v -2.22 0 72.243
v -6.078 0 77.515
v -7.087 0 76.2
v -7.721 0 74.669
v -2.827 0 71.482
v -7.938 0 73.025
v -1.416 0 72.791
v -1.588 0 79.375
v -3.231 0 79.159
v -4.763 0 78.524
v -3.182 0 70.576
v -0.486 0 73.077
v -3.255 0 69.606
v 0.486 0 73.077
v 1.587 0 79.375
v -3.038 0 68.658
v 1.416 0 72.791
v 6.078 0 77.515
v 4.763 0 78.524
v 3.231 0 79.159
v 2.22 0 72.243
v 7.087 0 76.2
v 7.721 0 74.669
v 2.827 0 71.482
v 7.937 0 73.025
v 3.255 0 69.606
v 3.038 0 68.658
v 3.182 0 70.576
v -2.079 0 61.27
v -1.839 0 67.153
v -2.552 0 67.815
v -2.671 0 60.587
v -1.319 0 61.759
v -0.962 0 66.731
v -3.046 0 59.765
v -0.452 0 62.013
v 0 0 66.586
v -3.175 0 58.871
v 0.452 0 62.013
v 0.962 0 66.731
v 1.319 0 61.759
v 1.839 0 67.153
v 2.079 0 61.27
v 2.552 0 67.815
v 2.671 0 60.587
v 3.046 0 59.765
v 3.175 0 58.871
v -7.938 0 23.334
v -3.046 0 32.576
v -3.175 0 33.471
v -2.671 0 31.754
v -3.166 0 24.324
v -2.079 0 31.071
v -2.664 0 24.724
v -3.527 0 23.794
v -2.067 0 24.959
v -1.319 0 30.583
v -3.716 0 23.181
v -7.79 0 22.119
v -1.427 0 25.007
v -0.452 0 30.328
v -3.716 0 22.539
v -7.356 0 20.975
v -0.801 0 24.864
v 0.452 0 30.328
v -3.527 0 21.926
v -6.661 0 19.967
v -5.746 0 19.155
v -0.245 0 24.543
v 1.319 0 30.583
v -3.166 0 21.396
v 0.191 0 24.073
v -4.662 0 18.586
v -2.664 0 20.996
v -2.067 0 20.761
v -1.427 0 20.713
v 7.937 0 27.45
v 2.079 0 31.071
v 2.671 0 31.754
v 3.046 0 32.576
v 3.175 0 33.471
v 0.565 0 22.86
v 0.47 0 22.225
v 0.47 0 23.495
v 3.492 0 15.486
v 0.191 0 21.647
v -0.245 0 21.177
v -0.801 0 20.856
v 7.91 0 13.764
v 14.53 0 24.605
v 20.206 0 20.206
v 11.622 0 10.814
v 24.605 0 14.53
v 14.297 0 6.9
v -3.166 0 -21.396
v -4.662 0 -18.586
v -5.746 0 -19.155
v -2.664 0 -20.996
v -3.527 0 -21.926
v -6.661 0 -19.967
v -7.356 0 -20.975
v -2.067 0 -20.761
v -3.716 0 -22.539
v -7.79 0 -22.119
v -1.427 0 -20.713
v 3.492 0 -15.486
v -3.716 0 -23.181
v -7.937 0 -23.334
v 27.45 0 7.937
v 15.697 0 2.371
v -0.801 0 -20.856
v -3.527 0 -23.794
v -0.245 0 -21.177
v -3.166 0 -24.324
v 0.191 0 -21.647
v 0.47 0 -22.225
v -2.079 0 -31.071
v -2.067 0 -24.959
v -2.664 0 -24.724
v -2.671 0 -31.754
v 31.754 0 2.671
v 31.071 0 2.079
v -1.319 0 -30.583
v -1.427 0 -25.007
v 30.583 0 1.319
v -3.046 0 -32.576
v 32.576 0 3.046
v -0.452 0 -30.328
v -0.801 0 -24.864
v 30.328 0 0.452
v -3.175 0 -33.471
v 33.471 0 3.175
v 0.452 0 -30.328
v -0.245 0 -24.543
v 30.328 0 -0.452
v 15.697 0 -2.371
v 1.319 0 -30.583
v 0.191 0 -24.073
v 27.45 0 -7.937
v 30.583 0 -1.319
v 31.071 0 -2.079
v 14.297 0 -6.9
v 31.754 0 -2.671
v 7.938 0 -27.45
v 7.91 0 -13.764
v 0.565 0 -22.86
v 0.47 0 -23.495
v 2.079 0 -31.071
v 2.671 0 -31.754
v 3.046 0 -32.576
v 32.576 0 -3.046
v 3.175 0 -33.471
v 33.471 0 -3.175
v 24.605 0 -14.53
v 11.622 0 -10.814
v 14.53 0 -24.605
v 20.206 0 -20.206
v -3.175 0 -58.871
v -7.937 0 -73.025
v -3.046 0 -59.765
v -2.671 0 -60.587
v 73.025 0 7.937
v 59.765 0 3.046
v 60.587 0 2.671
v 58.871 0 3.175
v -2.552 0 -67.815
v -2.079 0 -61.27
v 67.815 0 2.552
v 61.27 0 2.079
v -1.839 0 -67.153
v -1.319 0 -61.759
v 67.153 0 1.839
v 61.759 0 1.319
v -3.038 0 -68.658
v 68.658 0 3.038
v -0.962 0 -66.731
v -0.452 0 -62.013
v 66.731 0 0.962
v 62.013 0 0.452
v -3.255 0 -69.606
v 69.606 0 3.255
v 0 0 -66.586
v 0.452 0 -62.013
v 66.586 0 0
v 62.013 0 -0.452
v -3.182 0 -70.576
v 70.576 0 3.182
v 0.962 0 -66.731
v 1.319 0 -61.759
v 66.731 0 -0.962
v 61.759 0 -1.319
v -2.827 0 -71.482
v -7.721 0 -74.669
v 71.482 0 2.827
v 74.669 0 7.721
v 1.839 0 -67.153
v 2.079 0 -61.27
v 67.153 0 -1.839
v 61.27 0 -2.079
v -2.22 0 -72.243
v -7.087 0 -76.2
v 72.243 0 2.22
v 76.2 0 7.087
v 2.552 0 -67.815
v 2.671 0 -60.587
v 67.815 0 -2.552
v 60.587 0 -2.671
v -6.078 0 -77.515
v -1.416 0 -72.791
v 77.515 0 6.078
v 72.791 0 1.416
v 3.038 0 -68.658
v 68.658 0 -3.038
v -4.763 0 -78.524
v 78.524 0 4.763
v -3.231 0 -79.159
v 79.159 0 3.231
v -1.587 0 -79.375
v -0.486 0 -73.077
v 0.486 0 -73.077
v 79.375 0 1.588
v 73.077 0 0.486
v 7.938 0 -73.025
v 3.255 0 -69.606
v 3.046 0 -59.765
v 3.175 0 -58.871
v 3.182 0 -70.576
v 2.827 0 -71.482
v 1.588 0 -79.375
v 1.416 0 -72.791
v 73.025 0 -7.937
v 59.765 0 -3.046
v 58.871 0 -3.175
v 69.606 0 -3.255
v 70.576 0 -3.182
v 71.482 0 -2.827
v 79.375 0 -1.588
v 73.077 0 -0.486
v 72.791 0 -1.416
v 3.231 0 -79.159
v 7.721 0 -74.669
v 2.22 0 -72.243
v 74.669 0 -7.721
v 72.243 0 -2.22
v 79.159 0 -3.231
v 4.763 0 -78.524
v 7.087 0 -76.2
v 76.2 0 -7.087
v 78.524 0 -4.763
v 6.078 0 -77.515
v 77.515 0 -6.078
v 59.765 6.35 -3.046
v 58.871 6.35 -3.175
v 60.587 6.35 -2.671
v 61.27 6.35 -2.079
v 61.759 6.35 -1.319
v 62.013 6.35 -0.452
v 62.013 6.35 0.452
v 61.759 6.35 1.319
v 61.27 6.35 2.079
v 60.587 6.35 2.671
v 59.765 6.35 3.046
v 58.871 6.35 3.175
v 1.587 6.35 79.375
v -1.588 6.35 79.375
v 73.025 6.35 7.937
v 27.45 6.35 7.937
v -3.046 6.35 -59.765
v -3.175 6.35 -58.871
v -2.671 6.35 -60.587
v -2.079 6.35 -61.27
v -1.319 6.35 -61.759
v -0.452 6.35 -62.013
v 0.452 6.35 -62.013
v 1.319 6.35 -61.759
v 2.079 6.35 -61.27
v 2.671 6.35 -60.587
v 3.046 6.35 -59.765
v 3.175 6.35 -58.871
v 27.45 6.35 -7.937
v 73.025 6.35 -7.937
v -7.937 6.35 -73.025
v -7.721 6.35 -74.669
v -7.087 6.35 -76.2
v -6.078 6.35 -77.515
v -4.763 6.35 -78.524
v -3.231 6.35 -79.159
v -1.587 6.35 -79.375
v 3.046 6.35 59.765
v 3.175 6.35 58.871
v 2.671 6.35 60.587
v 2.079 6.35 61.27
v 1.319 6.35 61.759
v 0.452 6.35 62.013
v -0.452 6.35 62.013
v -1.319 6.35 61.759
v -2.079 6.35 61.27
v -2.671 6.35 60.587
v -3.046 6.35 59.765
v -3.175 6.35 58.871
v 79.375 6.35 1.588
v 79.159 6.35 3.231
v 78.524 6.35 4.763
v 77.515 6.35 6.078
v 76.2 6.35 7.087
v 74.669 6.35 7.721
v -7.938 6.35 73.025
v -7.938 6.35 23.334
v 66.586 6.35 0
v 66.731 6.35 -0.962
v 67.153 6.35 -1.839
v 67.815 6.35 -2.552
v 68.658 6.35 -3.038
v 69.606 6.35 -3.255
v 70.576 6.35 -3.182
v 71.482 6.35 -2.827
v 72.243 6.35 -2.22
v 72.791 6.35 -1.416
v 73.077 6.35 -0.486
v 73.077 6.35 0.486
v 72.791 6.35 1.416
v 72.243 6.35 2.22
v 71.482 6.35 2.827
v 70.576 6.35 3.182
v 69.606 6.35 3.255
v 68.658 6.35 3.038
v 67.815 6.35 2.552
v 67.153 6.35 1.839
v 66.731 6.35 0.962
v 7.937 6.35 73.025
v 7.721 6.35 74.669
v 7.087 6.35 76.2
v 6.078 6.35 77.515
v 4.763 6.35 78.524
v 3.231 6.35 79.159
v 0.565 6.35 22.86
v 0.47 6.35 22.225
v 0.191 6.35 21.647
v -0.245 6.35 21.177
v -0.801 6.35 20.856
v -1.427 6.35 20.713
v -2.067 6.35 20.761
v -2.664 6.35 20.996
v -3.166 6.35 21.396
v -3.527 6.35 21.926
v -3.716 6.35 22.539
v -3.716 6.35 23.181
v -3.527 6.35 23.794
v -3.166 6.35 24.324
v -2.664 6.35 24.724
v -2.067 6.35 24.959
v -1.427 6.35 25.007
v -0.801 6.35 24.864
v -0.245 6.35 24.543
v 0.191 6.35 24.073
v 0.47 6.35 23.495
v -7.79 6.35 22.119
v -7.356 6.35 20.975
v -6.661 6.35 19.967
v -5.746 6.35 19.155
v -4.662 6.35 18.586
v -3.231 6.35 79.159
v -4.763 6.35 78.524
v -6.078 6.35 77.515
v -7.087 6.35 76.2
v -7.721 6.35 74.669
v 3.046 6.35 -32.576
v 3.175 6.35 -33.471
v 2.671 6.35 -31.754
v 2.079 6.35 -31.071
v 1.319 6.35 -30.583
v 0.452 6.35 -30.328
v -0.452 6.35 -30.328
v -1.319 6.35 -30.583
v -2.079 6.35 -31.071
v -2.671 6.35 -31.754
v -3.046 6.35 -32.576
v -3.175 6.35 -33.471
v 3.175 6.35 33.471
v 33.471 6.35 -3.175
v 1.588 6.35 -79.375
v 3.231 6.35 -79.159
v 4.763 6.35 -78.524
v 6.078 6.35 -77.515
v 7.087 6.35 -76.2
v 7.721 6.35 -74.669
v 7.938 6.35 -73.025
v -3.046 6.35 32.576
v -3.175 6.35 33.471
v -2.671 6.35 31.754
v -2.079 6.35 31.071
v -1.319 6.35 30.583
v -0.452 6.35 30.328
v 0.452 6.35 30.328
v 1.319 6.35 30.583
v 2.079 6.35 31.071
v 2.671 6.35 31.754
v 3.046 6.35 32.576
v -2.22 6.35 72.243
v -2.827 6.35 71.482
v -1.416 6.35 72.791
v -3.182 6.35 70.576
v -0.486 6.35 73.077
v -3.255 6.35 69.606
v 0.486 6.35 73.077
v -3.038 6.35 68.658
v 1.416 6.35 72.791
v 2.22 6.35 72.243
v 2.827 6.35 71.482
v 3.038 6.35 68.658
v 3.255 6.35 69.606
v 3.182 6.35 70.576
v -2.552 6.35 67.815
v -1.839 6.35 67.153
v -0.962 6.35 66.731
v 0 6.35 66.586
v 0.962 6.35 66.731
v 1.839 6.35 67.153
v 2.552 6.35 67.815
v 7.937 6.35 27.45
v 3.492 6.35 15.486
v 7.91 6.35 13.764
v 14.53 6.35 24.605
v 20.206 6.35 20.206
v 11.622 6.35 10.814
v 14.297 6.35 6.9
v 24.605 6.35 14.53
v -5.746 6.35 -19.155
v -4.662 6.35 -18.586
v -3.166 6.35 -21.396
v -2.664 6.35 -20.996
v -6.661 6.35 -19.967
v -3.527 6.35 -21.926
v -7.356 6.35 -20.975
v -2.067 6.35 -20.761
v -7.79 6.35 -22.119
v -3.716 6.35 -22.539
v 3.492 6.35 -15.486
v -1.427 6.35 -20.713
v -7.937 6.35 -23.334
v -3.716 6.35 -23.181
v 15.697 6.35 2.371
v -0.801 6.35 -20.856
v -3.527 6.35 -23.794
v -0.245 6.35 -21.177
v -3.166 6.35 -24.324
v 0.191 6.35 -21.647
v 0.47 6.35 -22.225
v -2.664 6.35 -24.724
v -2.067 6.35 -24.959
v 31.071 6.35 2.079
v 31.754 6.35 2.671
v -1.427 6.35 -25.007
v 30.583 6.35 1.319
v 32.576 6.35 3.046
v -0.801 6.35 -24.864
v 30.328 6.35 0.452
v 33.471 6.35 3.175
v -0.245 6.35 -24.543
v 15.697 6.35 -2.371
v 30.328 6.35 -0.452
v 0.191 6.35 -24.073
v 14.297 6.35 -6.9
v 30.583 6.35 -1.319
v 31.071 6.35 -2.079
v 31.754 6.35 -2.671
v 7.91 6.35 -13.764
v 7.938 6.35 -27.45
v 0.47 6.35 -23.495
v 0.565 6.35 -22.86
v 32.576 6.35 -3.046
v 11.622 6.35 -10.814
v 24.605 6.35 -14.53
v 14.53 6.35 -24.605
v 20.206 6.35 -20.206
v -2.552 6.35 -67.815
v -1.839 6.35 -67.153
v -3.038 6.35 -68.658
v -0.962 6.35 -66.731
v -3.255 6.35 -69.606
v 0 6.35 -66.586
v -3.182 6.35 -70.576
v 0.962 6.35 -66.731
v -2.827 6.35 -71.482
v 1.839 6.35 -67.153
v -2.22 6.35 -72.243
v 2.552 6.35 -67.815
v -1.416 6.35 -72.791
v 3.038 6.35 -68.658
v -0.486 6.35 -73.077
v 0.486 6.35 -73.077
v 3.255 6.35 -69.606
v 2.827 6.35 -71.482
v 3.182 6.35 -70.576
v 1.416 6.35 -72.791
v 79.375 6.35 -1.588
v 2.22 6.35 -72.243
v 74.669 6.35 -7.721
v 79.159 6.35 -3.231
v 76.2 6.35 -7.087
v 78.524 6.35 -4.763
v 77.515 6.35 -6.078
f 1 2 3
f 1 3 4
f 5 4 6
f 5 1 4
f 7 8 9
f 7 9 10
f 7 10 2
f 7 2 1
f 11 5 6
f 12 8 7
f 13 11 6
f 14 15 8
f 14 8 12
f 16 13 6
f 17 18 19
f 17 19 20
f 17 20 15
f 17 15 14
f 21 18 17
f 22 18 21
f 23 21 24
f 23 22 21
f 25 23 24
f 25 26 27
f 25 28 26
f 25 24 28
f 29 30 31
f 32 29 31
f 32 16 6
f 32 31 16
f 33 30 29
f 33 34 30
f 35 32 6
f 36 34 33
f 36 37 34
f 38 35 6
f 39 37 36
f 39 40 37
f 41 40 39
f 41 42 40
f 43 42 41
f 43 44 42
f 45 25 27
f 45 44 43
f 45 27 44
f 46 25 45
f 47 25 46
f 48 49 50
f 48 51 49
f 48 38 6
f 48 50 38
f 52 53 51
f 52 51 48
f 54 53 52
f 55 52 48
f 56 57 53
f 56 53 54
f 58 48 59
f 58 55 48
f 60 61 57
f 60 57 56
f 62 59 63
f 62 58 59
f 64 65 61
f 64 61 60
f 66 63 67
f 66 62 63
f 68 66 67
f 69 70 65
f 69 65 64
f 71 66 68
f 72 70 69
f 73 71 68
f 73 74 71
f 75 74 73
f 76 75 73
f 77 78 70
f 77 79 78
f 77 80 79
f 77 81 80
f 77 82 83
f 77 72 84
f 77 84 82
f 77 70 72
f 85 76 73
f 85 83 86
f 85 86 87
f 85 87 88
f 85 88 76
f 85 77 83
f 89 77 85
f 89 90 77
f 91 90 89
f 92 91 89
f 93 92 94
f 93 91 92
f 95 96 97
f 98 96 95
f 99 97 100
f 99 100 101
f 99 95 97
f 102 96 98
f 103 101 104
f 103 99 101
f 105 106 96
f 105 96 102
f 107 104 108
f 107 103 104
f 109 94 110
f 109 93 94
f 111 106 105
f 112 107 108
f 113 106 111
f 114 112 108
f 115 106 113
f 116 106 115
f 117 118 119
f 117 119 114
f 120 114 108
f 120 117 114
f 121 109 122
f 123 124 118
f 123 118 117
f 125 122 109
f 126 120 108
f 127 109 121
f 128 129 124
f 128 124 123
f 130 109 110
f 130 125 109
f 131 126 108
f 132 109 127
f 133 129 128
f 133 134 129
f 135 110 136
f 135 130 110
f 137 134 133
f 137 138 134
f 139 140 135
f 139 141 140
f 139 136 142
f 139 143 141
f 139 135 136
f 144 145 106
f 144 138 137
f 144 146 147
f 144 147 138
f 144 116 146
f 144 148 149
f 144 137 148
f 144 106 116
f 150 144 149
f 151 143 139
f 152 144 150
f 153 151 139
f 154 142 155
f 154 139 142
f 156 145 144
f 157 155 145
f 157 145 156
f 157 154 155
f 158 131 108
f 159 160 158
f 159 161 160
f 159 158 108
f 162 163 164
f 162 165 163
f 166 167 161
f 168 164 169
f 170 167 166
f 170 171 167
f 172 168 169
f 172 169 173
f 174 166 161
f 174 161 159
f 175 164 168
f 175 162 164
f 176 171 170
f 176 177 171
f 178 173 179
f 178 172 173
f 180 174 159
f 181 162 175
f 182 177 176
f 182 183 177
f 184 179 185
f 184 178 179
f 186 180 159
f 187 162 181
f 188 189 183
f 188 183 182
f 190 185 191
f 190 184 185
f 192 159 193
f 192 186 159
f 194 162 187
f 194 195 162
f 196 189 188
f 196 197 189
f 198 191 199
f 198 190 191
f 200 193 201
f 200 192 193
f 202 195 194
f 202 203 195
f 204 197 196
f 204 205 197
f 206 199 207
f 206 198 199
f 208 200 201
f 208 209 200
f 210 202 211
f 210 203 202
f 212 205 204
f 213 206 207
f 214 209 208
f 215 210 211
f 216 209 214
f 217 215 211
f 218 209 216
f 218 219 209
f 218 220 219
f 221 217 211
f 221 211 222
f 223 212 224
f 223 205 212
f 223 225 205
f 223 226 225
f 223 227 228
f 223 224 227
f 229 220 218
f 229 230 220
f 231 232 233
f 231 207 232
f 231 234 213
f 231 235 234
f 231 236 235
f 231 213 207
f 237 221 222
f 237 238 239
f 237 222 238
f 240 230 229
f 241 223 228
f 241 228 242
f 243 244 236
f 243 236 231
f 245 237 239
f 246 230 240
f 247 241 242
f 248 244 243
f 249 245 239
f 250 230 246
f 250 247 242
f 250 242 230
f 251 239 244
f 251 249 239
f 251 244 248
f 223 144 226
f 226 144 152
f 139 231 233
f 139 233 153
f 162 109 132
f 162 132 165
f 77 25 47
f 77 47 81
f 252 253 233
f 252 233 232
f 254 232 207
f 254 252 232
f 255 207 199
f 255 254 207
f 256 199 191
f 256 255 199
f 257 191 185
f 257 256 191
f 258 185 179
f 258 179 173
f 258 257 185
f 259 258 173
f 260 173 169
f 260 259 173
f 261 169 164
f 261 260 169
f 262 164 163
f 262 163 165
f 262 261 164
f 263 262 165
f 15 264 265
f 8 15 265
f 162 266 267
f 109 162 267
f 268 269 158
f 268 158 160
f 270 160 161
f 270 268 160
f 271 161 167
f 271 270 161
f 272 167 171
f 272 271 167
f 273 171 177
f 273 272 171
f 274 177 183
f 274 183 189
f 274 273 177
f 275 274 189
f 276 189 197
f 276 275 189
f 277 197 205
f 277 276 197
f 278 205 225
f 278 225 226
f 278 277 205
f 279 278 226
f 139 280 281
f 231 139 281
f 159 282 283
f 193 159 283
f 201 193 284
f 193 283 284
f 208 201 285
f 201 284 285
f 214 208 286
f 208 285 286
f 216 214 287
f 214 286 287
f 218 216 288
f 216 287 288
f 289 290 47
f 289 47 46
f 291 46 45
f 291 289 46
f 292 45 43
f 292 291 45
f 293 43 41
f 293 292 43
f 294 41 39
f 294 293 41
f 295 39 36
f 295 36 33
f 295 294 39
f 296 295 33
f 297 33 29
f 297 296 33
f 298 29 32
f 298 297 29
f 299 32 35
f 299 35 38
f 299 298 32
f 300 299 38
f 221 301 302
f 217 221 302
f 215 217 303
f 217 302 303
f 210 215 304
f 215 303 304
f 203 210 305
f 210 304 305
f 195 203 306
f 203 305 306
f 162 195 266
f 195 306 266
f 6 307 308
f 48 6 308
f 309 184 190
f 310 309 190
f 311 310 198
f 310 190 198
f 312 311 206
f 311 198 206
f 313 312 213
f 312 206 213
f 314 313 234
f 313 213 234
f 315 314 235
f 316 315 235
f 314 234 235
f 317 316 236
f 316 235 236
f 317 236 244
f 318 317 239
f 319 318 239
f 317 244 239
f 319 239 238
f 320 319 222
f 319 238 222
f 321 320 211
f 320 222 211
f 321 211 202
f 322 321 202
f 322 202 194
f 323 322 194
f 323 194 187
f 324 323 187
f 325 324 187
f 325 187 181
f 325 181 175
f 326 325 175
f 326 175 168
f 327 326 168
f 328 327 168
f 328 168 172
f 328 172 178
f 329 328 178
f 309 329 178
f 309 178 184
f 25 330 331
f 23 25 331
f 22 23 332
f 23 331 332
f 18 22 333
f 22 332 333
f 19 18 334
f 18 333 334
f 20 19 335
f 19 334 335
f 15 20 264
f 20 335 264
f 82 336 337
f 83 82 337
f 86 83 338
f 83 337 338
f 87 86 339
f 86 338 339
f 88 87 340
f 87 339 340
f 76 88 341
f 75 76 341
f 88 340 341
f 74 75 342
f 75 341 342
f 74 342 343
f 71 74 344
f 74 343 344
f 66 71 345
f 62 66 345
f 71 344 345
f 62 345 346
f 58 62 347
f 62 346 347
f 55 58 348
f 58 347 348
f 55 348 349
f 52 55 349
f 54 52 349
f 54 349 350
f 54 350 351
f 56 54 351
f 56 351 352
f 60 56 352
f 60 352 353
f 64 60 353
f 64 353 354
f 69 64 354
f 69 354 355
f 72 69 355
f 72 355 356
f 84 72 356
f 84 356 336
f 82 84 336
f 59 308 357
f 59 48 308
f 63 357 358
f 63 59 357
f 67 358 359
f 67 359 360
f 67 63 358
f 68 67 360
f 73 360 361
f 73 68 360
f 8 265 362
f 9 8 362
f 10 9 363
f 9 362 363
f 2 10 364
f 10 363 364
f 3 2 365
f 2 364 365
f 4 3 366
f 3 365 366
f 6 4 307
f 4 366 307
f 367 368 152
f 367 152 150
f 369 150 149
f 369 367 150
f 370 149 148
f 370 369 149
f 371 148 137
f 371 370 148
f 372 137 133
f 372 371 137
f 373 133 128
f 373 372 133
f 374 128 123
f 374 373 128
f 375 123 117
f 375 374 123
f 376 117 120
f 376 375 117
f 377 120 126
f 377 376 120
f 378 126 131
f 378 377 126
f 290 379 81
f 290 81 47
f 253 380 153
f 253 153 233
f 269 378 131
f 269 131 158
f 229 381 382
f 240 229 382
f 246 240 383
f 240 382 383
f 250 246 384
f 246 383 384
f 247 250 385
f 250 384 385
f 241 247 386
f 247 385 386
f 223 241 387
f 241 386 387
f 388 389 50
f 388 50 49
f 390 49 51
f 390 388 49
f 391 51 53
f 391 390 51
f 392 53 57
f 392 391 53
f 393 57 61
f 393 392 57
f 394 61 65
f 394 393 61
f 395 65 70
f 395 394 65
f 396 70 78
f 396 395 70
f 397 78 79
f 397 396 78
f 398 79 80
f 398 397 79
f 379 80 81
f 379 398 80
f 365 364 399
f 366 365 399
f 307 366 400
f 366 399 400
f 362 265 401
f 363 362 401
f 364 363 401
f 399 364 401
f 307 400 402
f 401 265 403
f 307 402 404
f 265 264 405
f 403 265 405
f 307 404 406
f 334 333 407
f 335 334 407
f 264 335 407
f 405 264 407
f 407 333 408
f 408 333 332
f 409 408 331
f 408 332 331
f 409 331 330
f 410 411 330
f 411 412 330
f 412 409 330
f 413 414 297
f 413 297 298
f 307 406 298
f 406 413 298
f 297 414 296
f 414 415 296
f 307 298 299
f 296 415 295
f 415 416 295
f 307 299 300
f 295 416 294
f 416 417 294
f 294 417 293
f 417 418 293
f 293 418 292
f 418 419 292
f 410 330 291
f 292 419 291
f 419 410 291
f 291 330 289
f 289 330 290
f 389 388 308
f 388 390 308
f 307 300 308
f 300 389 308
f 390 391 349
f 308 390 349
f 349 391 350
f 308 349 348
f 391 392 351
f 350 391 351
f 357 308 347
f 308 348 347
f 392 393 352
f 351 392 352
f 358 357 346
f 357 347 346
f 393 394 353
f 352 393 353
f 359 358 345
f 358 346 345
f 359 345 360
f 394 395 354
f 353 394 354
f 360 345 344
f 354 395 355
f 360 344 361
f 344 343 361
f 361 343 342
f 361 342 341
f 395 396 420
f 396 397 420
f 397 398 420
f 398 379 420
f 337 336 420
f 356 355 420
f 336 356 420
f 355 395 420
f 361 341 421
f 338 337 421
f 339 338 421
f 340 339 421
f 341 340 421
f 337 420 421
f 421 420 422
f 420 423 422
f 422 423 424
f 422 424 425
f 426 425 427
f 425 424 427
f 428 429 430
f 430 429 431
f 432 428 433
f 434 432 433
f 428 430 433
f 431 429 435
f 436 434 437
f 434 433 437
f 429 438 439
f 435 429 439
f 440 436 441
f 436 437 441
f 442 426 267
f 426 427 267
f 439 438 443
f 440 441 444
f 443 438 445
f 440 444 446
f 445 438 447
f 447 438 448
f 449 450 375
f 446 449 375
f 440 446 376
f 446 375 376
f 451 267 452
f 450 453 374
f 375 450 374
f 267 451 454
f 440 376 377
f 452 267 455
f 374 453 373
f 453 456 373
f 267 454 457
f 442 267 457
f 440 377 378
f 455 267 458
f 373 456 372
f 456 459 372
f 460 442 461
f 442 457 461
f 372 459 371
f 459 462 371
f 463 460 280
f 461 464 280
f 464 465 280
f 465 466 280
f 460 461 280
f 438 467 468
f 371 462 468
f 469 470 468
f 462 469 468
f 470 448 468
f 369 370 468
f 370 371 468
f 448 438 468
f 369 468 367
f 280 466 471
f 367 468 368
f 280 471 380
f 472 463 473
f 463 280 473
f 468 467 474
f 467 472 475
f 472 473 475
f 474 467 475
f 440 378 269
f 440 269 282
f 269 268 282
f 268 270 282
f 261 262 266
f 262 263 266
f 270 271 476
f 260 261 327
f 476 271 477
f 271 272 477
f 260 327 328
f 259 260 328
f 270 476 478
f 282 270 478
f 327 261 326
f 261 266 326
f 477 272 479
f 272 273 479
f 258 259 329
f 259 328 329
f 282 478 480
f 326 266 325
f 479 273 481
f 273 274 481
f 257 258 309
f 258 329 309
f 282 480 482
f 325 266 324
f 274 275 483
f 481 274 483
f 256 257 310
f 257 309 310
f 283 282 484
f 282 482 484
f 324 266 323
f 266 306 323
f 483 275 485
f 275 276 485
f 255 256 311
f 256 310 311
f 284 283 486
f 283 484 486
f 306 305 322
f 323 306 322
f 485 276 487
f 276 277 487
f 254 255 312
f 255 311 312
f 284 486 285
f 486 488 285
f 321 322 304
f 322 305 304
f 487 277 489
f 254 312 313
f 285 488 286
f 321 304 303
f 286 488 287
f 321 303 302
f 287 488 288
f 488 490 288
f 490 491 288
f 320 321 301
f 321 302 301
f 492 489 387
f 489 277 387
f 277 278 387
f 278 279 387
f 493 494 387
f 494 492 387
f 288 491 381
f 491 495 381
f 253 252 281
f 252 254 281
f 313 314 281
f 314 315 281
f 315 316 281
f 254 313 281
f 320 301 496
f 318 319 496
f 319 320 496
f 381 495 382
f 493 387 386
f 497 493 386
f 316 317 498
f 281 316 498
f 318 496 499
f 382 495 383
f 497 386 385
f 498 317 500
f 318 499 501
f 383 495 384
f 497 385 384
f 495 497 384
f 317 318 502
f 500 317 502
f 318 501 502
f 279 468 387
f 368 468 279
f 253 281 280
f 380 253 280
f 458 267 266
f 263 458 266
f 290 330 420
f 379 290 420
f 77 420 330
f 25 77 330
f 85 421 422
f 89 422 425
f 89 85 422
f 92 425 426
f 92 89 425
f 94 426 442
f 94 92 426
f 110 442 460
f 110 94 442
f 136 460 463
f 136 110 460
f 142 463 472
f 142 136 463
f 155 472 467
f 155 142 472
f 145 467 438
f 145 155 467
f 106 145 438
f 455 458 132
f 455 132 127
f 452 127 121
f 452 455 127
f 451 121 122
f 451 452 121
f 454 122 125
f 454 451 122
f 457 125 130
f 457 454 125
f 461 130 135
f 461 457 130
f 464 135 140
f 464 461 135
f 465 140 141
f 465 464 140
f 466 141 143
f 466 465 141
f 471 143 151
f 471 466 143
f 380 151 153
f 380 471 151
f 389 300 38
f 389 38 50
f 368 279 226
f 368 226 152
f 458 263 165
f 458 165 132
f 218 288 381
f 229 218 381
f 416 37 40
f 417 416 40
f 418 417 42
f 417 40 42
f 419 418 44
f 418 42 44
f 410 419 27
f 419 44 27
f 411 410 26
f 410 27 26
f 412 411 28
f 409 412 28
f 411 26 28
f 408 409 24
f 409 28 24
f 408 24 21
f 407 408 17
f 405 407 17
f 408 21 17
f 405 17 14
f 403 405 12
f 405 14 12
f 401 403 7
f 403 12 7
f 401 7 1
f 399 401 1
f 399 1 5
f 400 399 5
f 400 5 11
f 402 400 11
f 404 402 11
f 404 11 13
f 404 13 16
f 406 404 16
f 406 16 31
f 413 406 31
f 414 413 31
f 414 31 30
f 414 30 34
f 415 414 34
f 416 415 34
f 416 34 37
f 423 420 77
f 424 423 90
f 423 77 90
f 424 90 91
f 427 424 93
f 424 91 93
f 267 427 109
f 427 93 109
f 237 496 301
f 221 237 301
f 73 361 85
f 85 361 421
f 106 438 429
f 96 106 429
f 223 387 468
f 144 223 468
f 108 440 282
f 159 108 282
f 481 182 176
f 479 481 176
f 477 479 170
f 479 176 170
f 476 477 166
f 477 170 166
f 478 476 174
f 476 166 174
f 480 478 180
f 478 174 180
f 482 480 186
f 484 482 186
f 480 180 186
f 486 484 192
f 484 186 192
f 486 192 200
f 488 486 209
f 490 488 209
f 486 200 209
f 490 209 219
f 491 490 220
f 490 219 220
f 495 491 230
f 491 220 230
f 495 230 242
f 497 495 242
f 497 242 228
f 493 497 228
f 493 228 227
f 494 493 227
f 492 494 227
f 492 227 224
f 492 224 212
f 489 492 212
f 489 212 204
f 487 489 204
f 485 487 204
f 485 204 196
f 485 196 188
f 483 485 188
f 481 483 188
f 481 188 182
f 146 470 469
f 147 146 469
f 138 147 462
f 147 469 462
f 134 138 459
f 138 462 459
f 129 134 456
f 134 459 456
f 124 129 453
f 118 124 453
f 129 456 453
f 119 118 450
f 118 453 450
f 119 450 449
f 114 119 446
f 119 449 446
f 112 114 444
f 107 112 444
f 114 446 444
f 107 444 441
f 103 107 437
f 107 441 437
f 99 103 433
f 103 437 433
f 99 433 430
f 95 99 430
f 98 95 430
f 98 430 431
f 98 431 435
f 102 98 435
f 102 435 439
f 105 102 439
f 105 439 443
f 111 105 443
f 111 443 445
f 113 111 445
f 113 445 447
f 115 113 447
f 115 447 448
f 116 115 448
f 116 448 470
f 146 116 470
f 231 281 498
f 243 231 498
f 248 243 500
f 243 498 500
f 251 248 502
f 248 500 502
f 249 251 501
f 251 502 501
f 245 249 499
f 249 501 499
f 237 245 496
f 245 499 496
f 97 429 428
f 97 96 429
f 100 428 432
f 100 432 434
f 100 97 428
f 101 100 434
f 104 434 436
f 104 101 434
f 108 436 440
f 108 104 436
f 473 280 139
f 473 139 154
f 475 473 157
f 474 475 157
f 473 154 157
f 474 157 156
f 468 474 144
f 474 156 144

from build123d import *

# Parameters (mm, degrees)
SKETCH1_R                = 28.575
SKETCH1_R_2              = 15.875
BOSS_EXTRUDE1_DEPTH      = 6.35
BOSS_EXTRUDE2_DEPTH      = 6.35
F_0_257_DIAMETER_HOLE1_D = 6.5278
CIRPATTERN1_COUNT        = 4
CUT_EXTRUDE1_DEPTH       = 7.35
FILLET1_R                = 5.08
SKETCH6_R                = 2.15265
CUT_EXTRUDE2_DEPTH       = 7.35


with BuildPart() as part:
    # Sketch1 → Boss-Extrude1 (new body)
    with BuildSketch(Plane(origin=(0, 0, 0), x_dir=(1, 0, 0), z_dir=(0, 1, 0))):
        Circle(SKETCH1_R)
        Circle(SKETCH1_R_2, mode=Mode.SUBTRACT)
    extrude(amount=BOSS_EXTRUDE1_DEPTH)

    # Sketch2 → Boss-Extrude2 (add)
    with BuildSketch(Plane(origin=(0, 6.35, 0), x_dir=(1, 0, 0), z_dir=(0, 1, 0))):
        with BuildLine():
            Line((73.025, -7.9375), (25.4, -7.9375))
            Line((25.4, -7.9375), (25.4, 7.9375))
            Line((25.4, 7.9375), (73.025, 7.9375))
            ThreePointArc((73.025, 7.9375), (77.515128061, 6.077628061), (79.375, 1.5875))
            Line((79.375, 1.5875), (79.375, -1.5875))
            ThreePointArc((79.375, -1.5875), (77.515128061, -6.077628061), (73.025, -7.9375))
        make_face()
        with BuildLine():
            Line((58.870802517, -3.175), (33.470802517, -3.175))
            ThreePointArc((33.470802517, -3.175), (30.295802517, 0), (33.470802517, 3.175))
            Line((33.470802517, 3.175), (58.870802517, 3.175))
            ThreePointArc((58.870802517, 3.175), (62.045802517, 0), (58.870802517, -3.175))
        make_face(mode=Mode.SUBTRACT)
    boss_extrude2 = extrude(amount=-BOSS_EXTRUDE2_DEPTH)

    # F (0.257) Diameter Hole1 (through all)
    with Locations(Plane(origin=(0, 6.35, 0), x_dir=(1, 0, 0), z_dir=(0, 1, 0))):
        with Locations((69.85, 0)):
            f_0_257_diameter_hole1 = Hole(F_0_257_DIAMETER_HOLE1_D / 2)

    # CirPattern1: Boss-Extrude2, F (0.257) Diameter Hole1 ×4 about axis
    cirpattern1_axis = Axis((0, 0, 0), (0, 1, 0))
    for i in range(1, CIRPATTERN1_COUNT):
        add(boss_extrude2.rotate(cirpattern1_axis, i * 360 / CIRPATTERN1_COUNT))
        add(f_0_257_diameter_hole1.rotate(cirpattern1_axis, i * 360 / CIRPATTERN1_COUNT), mode=Mode.SUBTRACT)

    # Sketch5 → Cut-Extrude1 (cut, through all)
    with BuildSketch(Plane(origin=(0, 6.35, 0), x_dir=(1, 0, 0), z_dir=(0, 1, 0))):
        Polygon((-7.9375, 19.830441139), (-7.9375, 27.450441139), (-7.9375, 52.536571615), (-88.152777481, 52.536571615), (-88.152777481, -52.536571615), (-7.9375, -52.536571615), (-7.9375, -27.450441139), (-7.9375, -19.830441139), (3.4925, -15.486060466), (3.4925, 15.486060466), align=None)
    extrude(amount=-CUT_EXTRUDE1_DEPTH, mode=Mode.SUBTRACT)

    # Fillet1
    fillet1_edges = [part.edges().sort_by_distance(p)[0] for p in [
        (-7.9375, 3.175, 19.830441139),
        (-7.9375, 3.175, -19.830441139),
    ]]
    fillet(fillet1_edges, radius=FILLET1_R)

    # Sketch6 → Cut-Extrude2 (cut, through all)
    with BuildSketch(Plane(origin=(0, 6.35, 0), x_dir=(1, 0, 0), z_dir=(0, 1, 0))):
        with Locations((-1.5875, 22.86)):
            Circle(SKETCH6_R)
        with Locations((-1.5875, -22.86)):
            Circle(SKETCH6_R)
    extrude(amount=-CUT_EXTRUDE2_DEPTH, mode=Mode.SUBTRACT)


solid = part.part
